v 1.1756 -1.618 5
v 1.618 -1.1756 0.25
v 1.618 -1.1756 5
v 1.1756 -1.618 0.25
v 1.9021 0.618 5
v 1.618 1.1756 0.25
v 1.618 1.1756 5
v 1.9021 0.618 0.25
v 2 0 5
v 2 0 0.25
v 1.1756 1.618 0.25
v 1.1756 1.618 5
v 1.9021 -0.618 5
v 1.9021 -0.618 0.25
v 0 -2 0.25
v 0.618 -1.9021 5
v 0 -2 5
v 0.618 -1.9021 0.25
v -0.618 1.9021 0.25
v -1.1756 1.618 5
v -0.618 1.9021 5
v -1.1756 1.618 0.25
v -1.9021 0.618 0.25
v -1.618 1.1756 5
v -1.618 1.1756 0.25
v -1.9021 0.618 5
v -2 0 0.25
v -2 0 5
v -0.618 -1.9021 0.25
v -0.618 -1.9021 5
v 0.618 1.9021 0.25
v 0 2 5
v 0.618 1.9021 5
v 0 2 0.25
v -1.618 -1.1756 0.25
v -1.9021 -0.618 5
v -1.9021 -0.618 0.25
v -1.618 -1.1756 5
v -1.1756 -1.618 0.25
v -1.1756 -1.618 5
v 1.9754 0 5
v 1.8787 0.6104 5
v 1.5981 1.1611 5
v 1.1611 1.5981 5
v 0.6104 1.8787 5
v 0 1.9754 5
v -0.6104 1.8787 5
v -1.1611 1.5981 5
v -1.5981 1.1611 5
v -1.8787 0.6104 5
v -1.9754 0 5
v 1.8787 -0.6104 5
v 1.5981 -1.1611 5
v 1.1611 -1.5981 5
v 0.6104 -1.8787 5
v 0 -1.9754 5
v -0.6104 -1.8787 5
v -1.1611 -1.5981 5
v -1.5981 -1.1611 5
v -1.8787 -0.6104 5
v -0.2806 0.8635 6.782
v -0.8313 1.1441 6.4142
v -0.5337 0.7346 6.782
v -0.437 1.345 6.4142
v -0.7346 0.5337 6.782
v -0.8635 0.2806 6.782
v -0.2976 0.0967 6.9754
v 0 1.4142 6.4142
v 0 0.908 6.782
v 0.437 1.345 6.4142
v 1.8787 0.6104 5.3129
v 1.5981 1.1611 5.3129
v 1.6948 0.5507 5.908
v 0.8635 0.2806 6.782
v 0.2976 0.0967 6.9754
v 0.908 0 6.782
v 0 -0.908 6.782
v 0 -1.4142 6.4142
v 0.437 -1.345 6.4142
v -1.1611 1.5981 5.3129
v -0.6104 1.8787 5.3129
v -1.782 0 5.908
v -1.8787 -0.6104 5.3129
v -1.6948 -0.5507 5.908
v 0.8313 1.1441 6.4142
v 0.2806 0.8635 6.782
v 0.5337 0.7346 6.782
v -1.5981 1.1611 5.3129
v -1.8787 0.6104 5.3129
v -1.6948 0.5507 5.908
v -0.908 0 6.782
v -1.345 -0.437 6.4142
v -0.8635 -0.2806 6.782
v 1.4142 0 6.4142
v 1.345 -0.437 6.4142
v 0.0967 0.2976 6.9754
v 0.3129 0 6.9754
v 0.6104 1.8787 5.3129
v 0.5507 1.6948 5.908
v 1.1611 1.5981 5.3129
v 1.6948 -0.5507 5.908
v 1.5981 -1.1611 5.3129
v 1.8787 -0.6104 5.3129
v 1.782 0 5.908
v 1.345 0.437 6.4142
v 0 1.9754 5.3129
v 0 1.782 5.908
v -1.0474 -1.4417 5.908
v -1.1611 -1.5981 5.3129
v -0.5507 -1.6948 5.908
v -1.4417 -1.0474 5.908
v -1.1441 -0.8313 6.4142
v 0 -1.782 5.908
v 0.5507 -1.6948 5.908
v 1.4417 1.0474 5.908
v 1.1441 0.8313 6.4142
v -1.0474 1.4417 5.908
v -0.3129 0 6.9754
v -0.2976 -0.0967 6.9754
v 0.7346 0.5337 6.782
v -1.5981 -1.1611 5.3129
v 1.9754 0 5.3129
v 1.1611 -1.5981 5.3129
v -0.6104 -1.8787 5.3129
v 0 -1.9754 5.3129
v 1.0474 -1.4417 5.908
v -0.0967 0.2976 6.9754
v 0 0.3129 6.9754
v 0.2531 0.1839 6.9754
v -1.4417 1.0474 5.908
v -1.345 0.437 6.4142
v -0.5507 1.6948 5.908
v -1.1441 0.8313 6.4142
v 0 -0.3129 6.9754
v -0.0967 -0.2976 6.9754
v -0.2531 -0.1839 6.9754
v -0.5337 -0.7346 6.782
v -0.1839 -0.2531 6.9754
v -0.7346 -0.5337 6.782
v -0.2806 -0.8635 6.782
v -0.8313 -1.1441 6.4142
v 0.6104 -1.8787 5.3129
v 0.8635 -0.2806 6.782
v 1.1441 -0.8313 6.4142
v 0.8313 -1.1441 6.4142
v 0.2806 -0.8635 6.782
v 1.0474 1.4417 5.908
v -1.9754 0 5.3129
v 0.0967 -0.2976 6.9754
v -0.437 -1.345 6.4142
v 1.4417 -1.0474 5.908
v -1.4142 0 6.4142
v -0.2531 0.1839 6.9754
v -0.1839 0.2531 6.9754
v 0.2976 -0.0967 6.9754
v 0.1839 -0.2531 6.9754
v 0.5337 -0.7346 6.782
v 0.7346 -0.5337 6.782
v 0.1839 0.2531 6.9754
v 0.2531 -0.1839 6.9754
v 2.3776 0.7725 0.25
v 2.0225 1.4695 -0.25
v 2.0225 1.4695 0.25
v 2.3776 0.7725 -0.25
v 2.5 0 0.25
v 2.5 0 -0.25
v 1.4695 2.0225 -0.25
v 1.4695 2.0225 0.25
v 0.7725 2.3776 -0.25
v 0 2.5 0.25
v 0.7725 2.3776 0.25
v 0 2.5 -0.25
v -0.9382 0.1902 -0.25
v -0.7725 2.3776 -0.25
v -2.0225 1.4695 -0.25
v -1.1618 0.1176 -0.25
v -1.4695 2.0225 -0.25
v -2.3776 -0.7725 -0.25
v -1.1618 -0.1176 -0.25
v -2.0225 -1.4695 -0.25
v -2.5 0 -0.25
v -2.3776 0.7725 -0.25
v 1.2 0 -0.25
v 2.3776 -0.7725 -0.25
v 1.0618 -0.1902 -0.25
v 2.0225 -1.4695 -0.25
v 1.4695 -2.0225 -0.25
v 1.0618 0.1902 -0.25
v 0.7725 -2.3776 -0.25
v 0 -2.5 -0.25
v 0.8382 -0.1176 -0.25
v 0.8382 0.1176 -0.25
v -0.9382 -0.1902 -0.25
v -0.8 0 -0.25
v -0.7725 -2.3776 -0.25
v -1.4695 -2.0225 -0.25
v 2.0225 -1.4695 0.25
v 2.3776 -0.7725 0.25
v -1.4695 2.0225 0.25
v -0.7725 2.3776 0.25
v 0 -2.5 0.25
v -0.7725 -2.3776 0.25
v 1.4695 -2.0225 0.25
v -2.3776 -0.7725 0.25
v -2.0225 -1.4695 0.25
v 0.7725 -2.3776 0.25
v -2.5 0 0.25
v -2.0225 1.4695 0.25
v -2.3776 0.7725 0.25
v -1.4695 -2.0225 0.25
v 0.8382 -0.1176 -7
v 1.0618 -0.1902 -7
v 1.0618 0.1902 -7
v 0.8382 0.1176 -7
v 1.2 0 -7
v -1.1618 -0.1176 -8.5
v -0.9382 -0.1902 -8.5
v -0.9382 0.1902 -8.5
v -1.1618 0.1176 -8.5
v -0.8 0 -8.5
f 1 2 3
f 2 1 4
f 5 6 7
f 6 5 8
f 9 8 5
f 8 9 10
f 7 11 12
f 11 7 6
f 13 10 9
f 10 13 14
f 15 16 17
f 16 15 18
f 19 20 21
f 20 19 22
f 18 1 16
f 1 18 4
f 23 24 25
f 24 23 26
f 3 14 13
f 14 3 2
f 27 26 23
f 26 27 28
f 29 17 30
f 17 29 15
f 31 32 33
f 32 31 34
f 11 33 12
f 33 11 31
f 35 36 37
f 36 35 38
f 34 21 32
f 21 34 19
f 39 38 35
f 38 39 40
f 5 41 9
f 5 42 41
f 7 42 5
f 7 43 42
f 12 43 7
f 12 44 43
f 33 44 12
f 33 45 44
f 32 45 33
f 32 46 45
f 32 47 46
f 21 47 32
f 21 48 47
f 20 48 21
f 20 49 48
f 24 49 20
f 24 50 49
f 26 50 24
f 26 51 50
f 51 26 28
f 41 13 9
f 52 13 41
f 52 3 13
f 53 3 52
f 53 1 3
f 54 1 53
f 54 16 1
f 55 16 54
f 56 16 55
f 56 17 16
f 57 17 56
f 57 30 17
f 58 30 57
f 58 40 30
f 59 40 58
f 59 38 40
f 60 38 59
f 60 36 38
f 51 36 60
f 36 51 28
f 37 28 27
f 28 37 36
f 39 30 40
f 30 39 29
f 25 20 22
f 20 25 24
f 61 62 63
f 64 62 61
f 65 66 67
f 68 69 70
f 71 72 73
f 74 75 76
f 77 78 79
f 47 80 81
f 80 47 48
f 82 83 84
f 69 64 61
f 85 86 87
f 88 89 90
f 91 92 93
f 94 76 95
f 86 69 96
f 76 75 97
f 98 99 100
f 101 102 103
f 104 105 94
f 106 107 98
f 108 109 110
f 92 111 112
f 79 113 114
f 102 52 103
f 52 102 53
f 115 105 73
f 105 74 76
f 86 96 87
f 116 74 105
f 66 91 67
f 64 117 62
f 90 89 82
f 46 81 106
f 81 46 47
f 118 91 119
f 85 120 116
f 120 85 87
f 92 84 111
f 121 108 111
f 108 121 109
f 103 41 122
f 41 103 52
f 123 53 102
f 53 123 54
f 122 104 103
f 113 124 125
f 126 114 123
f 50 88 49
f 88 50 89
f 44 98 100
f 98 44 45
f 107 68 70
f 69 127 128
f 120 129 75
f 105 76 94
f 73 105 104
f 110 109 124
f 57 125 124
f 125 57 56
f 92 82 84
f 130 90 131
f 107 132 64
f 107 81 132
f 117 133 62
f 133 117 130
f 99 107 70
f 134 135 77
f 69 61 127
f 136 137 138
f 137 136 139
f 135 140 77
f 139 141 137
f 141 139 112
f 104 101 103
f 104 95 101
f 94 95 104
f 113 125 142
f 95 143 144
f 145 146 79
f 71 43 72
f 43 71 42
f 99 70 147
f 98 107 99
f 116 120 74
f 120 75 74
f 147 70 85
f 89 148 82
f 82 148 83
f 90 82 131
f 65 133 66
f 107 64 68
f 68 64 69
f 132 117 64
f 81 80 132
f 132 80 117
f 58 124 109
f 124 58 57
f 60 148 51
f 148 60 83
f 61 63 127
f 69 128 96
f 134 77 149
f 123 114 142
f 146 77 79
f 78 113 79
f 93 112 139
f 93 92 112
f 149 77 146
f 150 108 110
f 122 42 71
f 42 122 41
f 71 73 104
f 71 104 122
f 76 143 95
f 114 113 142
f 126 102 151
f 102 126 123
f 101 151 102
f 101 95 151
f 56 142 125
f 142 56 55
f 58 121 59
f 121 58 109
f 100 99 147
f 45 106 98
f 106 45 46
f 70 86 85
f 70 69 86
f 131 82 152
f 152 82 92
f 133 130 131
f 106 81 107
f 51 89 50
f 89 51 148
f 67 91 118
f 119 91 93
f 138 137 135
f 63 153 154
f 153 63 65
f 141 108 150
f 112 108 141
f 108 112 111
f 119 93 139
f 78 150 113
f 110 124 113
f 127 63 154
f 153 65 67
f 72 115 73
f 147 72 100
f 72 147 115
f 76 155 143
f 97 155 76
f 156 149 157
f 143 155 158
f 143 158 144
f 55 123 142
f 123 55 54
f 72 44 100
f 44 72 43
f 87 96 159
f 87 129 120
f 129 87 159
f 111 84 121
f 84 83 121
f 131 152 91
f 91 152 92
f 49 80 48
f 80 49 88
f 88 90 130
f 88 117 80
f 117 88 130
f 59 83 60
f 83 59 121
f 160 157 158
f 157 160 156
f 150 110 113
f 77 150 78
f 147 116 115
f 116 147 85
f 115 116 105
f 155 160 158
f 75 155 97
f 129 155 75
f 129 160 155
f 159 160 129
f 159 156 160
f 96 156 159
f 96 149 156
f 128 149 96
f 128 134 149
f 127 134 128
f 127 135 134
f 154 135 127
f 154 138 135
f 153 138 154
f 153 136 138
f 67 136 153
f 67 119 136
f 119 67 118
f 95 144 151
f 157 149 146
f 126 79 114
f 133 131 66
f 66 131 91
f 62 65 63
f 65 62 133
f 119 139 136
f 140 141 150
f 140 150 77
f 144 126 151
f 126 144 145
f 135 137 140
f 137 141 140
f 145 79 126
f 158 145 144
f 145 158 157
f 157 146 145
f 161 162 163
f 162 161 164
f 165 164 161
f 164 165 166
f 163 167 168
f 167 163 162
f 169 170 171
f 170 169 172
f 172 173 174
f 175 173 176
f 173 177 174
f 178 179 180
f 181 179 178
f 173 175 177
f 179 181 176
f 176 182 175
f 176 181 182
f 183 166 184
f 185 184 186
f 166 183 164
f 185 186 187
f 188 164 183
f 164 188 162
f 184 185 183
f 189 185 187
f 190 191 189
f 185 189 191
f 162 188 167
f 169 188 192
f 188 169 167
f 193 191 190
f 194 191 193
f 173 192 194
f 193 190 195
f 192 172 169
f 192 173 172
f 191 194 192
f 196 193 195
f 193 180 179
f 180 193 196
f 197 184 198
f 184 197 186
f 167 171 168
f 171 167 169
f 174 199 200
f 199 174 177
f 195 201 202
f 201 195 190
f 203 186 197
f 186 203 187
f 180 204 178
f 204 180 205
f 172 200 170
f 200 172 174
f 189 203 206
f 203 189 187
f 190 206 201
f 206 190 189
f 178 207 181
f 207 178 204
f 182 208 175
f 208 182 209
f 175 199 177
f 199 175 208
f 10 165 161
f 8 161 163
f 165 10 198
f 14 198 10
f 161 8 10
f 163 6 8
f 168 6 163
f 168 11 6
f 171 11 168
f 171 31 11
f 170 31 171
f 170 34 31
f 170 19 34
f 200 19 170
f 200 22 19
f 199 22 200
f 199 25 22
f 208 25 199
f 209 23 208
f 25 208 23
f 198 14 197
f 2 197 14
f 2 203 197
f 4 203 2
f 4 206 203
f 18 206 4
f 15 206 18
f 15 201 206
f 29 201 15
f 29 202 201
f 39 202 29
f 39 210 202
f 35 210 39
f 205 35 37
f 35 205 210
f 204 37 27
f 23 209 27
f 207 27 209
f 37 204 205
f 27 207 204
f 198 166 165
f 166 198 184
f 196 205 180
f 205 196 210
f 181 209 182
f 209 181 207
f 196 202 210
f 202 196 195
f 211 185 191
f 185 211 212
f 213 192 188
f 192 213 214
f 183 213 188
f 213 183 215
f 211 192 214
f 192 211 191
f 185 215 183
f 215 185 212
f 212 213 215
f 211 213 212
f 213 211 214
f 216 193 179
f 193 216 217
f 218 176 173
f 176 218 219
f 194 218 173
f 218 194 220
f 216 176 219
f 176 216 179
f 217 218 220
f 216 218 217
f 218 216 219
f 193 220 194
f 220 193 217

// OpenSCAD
module Led(Mat = 0){

Red = "#f70d1a";
Green = "#50C878";
Blue = "#162c99";
Yellow = "#e9d366";
White = "#fefdfa";

Material = [Red,Green,Blue,Yellow,White];


union(){
    color(Material[Mat], alpha = 0.9)
    cylinder(5,2,2, $fn = 20);


    color(Material[Mat], alpha = 0.9)
    translate([0,0,5])
    sphere(r = 2.0 ,$fn = 20);
}

color(Material[Mat], alpha = 0.9)
cylinder(0.5,2.5,2.5, $fn = 20, center= true);

color("gray")
translate([1,0,-3])
cylinder(8,0.2,0.2, $fn = 5, center= true);

color("gray")
translate([-1,0,-3])
cylinder(11,0.2,0.2, $fn = 5, center= true);

}



Led(Mat = 4);
